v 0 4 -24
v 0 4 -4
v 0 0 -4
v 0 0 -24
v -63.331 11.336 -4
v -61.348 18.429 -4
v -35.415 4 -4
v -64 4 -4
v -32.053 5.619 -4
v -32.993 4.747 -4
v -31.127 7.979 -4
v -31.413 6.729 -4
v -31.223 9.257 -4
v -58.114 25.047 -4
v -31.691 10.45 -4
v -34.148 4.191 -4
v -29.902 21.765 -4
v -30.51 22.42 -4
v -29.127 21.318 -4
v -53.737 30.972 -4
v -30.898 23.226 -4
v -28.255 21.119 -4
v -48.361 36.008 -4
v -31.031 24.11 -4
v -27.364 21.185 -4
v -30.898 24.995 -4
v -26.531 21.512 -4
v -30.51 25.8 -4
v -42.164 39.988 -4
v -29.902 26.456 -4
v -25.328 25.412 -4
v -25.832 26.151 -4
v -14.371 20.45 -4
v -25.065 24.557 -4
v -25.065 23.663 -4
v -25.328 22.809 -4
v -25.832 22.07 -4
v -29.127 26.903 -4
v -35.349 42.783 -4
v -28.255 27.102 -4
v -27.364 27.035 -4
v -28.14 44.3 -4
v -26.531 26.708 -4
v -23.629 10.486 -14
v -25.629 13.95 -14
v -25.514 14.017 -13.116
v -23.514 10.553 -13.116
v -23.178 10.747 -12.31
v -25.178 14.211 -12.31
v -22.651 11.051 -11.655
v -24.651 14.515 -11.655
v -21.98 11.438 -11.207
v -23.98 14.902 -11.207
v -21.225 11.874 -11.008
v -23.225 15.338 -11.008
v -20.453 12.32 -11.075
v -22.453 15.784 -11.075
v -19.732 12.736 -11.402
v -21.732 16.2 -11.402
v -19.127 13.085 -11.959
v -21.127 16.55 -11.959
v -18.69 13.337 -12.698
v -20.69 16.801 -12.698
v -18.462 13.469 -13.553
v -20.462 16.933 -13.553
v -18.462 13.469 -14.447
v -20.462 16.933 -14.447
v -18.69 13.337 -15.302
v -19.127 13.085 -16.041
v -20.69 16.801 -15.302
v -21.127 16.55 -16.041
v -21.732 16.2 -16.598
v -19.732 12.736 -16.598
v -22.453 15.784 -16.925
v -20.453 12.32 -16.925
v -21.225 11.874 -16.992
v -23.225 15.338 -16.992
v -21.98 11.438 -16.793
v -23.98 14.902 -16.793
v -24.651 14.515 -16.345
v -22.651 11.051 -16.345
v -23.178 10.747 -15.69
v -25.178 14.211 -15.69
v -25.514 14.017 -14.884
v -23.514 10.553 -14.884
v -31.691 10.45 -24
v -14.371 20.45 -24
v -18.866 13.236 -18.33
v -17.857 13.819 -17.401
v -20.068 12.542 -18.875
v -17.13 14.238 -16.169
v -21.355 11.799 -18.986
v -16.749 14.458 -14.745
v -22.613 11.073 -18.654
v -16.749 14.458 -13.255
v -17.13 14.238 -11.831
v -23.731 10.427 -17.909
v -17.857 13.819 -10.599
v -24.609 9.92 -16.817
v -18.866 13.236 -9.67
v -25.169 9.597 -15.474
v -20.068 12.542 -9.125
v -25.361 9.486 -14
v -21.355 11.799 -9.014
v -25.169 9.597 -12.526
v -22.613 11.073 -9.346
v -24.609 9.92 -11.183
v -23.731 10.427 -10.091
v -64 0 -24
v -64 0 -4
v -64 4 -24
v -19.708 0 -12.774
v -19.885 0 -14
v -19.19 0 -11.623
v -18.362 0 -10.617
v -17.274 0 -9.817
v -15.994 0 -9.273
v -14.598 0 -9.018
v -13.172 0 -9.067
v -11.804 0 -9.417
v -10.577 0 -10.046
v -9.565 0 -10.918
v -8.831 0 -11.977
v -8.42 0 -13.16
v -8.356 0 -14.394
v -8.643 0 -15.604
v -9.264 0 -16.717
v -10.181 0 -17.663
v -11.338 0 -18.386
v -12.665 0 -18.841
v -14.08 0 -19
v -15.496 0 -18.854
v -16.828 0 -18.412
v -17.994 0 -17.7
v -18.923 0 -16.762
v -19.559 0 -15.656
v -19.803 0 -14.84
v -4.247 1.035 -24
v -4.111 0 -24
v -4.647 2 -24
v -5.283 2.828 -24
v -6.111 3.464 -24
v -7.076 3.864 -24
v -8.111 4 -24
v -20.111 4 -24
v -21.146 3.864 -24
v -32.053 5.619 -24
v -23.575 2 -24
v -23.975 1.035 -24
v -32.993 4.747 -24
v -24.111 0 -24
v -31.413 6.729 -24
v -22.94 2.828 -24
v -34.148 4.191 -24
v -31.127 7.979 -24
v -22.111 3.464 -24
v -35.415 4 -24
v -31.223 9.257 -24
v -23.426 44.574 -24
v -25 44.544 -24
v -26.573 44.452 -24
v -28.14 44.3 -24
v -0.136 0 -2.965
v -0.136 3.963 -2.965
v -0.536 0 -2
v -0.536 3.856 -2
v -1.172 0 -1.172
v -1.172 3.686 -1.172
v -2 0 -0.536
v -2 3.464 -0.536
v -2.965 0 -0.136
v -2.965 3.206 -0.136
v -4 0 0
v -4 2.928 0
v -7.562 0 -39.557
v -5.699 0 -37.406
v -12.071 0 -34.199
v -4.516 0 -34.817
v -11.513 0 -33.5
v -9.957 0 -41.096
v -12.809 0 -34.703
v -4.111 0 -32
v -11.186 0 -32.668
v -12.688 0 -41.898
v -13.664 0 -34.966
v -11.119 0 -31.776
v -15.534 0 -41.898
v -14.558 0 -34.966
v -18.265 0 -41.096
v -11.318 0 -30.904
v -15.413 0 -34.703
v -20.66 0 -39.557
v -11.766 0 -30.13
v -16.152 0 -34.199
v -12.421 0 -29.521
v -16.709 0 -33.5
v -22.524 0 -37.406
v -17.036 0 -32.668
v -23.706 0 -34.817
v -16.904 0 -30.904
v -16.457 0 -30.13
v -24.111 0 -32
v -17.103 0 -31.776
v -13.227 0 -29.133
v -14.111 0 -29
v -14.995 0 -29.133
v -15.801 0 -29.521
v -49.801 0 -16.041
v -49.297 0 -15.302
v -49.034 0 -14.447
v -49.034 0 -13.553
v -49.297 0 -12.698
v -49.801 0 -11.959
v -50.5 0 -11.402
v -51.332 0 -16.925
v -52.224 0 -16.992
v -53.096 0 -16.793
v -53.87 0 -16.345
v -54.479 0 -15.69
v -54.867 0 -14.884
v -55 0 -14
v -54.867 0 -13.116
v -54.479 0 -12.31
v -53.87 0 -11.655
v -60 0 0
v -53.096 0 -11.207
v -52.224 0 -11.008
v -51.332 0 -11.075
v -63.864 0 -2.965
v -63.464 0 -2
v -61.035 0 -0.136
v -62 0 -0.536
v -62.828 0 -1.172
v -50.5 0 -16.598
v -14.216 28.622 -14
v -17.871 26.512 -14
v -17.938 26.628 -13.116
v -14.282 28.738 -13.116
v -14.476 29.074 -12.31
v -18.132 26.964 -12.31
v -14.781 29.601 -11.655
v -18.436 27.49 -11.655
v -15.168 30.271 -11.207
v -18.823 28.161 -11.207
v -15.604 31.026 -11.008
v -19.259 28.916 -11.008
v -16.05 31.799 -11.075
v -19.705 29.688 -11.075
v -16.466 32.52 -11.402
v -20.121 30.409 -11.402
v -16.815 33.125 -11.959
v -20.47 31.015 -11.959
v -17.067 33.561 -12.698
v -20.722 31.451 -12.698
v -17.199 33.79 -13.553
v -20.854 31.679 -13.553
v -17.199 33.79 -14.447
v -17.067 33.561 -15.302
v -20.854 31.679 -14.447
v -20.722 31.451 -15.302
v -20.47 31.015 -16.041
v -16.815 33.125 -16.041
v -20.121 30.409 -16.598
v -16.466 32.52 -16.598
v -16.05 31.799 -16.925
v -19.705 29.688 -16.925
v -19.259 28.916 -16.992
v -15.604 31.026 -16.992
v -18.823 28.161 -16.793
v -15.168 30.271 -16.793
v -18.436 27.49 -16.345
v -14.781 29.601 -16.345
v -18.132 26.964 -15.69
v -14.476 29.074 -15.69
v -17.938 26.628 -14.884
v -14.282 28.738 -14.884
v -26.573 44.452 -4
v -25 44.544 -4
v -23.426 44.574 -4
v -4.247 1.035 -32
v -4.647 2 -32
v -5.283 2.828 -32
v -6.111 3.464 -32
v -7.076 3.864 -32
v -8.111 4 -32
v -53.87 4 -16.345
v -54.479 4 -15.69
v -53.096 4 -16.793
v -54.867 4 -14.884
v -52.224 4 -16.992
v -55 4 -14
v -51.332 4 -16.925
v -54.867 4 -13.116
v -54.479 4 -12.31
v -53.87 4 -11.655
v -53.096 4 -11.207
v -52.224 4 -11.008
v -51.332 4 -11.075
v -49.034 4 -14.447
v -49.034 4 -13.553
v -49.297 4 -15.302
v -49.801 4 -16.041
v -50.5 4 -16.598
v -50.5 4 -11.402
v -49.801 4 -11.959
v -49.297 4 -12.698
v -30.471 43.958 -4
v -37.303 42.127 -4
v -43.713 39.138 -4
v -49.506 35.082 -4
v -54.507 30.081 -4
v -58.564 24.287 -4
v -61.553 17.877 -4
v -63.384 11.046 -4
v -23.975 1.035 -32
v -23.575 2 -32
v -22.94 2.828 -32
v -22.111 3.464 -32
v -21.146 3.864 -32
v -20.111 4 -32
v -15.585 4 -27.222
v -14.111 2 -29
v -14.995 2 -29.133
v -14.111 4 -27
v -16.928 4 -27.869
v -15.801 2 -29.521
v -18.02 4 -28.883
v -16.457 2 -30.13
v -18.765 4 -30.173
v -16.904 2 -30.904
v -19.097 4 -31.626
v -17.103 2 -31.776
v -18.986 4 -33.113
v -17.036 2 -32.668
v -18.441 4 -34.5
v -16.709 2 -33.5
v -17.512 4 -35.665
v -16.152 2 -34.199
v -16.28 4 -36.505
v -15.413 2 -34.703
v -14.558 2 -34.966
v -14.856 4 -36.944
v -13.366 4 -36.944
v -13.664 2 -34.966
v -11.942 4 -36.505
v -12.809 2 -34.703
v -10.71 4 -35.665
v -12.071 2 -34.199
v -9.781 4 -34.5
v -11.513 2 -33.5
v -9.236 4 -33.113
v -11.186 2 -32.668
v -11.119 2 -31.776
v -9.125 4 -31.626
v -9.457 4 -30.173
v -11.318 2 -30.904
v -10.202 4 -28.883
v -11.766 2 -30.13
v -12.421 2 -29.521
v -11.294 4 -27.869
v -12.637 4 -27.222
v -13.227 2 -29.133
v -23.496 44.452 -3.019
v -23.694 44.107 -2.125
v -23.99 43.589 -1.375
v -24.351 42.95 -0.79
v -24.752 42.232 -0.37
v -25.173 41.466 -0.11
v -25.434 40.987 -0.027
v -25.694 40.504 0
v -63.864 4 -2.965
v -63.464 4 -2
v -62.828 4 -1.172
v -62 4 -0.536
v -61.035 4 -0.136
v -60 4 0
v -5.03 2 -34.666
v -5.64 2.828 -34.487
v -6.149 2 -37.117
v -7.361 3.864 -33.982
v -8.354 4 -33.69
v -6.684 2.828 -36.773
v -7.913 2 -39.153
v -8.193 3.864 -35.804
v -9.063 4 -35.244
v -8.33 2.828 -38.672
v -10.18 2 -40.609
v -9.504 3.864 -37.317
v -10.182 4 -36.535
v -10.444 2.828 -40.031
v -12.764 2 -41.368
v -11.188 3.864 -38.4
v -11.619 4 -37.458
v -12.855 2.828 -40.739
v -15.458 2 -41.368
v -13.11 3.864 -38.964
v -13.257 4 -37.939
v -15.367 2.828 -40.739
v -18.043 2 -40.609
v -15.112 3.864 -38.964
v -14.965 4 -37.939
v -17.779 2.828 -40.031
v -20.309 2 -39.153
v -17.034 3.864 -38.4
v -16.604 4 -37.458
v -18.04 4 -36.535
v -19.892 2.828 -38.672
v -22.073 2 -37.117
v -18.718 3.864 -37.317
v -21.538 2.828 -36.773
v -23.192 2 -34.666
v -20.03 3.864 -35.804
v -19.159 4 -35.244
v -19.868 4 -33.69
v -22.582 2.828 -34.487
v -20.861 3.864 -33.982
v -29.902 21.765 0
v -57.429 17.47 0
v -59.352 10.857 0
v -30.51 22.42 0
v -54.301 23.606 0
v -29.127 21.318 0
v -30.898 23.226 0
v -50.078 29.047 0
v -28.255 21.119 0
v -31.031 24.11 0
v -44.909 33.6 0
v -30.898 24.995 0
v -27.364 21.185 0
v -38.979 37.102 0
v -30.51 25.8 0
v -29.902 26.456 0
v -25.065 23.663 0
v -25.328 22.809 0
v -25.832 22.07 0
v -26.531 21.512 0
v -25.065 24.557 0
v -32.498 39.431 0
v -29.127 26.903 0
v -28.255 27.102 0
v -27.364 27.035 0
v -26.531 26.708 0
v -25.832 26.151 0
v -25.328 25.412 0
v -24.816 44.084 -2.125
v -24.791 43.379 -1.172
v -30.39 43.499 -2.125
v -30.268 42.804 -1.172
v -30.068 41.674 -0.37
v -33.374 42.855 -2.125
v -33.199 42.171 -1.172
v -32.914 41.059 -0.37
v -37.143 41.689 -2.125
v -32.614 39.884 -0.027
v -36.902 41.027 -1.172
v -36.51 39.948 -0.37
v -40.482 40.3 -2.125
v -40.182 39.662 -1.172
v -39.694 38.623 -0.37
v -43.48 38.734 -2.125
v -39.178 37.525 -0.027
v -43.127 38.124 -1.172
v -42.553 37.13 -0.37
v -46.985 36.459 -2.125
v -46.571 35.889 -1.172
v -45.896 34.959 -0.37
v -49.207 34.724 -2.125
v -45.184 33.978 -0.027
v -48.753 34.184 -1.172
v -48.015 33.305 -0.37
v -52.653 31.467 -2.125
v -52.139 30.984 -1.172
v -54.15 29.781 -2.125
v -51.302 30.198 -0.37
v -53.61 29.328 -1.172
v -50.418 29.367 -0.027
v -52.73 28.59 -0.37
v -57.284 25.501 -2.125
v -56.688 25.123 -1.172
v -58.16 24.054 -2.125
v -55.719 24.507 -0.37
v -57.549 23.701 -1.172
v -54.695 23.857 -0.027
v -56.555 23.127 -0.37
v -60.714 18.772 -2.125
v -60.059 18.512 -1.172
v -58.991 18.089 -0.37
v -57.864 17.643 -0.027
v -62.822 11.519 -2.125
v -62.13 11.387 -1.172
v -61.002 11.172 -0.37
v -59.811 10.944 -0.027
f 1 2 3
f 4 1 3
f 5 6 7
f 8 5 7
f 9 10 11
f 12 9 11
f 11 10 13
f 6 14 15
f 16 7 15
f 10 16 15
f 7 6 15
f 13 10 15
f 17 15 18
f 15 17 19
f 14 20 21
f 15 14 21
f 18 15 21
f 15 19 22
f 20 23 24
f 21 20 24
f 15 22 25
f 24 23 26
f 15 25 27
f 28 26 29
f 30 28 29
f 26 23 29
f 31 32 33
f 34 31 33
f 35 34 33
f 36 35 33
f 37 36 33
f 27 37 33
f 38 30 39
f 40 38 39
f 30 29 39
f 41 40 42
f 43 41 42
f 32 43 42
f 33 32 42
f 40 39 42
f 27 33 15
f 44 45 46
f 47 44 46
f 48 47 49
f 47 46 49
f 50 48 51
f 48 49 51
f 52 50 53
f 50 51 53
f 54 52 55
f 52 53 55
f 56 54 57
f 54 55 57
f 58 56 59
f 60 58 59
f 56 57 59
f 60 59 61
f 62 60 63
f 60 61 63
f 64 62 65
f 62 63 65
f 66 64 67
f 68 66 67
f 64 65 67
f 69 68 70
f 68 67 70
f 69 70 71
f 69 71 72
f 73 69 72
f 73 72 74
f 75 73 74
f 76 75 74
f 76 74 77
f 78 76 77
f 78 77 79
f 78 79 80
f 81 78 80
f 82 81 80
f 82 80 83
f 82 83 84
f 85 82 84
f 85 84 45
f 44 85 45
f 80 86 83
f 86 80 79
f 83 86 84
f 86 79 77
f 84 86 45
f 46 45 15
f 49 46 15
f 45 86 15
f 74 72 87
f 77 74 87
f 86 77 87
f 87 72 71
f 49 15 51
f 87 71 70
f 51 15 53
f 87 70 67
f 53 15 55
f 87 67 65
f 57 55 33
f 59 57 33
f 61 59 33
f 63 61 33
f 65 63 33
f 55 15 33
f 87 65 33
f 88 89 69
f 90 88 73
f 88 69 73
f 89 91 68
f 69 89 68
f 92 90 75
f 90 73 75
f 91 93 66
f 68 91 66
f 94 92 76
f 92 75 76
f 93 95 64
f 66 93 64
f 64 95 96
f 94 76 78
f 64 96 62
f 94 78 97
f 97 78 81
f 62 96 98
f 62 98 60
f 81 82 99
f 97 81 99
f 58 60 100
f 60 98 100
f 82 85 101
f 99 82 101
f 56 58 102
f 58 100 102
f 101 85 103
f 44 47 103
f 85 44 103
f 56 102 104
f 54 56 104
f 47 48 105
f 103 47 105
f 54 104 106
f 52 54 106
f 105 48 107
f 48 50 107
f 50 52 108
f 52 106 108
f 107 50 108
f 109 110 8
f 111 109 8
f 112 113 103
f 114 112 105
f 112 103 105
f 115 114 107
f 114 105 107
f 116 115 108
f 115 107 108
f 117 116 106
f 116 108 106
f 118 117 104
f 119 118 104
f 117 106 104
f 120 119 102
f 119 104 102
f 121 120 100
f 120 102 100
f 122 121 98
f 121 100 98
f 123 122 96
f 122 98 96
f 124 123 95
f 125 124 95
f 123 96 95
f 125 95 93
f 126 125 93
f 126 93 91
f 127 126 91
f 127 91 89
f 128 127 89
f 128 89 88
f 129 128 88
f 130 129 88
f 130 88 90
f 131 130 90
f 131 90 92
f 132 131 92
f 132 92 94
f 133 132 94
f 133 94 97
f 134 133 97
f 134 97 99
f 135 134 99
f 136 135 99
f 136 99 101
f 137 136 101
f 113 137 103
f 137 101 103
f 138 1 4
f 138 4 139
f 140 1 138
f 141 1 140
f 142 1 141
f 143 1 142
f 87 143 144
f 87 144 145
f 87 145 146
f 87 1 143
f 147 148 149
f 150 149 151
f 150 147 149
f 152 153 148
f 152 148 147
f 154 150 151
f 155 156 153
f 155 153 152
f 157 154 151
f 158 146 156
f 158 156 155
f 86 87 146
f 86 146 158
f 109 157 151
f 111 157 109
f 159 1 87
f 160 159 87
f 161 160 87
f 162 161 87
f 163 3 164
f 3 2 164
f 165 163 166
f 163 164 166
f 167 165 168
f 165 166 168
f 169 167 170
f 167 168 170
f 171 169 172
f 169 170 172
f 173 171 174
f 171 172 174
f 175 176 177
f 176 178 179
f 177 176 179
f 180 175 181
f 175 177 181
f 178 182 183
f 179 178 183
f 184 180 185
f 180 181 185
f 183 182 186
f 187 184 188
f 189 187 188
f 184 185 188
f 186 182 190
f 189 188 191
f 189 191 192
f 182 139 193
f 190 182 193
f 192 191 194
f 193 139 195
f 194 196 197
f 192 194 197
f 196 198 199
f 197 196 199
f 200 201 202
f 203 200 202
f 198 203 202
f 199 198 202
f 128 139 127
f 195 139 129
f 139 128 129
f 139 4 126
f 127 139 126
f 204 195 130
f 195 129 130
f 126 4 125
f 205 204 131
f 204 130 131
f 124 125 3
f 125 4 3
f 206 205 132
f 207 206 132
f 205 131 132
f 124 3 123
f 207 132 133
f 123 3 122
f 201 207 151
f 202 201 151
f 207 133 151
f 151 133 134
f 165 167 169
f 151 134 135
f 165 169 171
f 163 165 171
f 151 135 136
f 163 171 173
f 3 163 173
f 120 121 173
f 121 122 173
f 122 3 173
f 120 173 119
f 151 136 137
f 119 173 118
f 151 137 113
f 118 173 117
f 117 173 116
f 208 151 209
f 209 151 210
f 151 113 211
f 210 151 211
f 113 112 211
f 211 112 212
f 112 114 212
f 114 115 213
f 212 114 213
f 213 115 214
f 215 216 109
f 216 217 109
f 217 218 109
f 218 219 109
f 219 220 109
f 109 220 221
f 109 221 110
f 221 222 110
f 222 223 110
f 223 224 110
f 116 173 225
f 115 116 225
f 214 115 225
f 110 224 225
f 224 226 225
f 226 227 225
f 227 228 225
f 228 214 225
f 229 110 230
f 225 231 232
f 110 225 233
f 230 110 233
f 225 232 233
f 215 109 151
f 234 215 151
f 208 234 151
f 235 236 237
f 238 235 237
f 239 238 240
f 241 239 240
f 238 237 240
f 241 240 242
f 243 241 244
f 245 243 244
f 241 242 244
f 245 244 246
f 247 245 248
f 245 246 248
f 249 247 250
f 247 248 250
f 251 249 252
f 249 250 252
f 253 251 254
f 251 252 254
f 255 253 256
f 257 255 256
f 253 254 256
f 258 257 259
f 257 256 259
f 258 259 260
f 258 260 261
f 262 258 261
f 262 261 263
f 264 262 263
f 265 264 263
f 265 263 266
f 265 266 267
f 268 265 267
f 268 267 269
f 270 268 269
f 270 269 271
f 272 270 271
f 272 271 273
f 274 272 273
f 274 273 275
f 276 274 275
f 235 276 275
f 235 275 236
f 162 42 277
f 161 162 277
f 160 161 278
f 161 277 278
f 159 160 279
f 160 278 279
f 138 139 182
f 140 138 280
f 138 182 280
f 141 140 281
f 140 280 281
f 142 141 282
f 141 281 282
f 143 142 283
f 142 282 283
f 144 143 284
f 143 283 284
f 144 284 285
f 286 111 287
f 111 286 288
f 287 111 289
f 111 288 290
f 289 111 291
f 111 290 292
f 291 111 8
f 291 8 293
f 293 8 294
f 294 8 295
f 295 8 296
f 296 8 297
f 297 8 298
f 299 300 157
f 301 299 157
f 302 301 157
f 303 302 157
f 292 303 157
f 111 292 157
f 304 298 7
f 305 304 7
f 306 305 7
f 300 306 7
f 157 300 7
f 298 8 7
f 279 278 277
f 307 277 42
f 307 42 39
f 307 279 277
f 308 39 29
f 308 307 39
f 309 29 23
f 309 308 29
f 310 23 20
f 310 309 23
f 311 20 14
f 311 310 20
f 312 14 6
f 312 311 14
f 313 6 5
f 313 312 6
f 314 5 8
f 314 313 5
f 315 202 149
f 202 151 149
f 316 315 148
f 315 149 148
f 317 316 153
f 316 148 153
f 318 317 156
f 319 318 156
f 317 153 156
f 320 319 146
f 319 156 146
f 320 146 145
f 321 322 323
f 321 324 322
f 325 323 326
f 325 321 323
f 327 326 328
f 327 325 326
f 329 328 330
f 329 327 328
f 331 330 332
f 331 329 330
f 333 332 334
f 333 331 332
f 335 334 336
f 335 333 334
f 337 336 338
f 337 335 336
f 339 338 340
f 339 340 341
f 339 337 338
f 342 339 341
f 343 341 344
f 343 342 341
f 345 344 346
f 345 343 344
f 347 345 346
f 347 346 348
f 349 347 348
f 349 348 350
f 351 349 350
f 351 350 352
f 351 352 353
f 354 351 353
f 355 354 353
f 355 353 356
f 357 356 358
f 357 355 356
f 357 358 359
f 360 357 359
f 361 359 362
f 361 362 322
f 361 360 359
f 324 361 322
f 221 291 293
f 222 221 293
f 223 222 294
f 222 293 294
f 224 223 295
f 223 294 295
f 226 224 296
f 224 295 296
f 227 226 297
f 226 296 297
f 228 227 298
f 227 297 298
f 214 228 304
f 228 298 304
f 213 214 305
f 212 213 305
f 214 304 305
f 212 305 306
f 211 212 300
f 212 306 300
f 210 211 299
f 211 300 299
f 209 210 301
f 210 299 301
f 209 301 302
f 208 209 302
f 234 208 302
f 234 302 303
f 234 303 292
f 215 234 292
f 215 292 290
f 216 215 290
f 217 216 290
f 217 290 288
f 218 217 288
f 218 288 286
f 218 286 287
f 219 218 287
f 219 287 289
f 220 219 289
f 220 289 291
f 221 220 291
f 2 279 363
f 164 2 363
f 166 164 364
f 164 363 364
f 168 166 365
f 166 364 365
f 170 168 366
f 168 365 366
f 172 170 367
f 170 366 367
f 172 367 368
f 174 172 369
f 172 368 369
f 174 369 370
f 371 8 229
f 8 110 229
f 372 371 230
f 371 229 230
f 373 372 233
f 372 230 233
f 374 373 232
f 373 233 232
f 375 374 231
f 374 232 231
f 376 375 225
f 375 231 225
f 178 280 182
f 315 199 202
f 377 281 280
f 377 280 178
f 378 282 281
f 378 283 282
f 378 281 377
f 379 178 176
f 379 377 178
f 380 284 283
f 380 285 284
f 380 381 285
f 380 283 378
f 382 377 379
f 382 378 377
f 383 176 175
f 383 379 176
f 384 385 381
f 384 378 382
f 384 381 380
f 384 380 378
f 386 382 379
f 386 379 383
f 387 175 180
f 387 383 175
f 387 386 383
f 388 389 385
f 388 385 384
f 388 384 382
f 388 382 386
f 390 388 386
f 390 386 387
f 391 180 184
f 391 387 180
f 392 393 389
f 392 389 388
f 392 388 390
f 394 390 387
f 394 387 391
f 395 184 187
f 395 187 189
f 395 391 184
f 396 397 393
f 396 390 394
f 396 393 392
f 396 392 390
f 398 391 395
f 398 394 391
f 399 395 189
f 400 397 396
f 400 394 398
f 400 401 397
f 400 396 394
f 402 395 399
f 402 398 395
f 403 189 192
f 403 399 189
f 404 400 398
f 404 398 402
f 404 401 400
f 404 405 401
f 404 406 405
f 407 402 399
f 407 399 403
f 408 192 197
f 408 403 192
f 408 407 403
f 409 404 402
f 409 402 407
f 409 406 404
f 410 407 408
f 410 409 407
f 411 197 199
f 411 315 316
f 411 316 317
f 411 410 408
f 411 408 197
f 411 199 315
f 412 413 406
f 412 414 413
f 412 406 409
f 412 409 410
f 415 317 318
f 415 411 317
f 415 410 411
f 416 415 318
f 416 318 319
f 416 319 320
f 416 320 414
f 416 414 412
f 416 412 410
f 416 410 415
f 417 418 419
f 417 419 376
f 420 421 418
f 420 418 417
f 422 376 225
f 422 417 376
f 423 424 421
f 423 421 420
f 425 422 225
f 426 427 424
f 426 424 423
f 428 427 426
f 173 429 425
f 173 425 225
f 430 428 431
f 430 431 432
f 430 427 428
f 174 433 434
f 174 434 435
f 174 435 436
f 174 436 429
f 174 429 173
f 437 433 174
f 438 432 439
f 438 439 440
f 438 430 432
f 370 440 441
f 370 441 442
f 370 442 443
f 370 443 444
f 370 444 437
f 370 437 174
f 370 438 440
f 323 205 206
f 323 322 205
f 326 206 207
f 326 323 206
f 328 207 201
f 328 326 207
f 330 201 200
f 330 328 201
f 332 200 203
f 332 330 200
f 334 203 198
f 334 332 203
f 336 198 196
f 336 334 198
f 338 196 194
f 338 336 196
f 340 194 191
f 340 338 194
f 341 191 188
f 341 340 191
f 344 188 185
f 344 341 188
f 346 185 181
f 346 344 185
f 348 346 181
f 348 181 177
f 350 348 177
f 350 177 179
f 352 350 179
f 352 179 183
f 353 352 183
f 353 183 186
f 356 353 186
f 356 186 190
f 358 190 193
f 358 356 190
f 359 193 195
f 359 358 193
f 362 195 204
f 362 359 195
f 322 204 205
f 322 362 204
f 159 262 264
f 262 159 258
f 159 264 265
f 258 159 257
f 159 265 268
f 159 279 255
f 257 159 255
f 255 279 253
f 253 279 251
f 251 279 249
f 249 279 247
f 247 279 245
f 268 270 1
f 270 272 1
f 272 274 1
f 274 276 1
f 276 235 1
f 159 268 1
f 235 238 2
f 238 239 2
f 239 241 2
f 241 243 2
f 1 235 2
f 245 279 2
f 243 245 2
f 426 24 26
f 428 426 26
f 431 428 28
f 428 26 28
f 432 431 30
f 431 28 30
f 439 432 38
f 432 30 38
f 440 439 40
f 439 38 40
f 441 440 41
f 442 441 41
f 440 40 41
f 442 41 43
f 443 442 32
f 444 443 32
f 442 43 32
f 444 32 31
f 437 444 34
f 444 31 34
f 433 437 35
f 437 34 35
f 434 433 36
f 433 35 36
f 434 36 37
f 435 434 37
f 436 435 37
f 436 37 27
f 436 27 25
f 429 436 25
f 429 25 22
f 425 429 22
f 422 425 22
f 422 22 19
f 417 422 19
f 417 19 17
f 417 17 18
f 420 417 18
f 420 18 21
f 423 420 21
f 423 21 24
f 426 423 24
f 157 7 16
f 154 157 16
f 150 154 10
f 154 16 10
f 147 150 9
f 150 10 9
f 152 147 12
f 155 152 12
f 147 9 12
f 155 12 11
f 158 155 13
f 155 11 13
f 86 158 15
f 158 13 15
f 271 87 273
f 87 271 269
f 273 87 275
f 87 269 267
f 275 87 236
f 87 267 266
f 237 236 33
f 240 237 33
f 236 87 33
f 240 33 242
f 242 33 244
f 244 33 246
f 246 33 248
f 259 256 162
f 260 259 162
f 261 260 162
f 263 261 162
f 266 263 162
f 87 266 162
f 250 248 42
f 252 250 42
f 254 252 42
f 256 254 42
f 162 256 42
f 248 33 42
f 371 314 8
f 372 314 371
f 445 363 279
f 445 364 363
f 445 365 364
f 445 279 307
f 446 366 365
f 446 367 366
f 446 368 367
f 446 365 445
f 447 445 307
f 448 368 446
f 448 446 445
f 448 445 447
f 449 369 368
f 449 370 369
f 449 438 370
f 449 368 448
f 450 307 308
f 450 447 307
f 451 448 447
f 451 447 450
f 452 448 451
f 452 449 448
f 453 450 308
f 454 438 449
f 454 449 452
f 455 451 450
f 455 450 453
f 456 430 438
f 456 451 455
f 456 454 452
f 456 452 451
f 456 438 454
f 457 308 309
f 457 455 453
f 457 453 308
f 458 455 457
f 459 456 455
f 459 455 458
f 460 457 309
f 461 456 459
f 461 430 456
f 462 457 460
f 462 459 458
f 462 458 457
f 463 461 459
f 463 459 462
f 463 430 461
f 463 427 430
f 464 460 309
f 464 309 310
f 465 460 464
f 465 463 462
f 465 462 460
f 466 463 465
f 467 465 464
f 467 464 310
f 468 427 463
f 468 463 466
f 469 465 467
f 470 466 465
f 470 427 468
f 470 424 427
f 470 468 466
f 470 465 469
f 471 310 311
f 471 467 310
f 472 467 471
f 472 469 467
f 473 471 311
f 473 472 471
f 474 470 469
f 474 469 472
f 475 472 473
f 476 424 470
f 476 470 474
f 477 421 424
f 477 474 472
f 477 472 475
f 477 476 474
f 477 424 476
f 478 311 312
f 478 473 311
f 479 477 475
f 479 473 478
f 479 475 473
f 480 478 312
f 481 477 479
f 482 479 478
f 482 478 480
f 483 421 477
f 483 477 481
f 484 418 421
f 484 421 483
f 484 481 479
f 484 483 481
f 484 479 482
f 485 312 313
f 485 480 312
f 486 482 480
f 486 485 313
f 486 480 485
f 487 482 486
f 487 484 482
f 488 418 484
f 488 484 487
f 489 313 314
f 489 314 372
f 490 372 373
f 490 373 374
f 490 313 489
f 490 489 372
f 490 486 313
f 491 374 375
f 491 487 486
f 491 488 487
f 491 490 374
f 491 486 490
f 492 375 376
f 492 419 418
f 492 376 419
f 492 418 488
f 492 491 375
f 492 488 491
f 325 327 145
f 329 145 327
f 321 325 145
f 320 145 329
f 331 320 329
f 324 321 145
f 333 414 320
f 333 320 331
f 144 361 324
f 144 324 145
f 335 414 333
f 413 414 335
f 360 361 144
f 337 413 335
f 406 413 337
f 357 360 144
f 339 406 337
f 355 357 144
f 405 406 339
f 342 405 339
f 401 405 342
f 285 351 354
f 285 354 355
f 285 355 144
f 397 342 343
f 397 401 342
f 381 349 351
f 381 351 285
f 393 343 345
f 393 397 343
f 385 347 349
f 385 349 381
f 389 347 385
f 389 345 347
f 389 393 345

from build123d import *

# Parameters (mm, degrees)
BOSS_EXTRUDE1_DEPTH = 4
BOSS_EXTRUDE2_DEPTH = 20
SKETCH3_R           = 3
CUT_EXTRUDE1_DEPTH  = 62.345545492
SKETCH4_R           = 5
CUT_EXTRUDE2_DEPTH  = 65.381139123
SKETCH5_R           = 3
CUT_EXTRUDE3_DEPTH  = 81.725682082
SKETCH6_R           = 3
CUT_EXTRUDE4_DEPTH  = 80.48760808
SKETCH7_R           = 3
CUT_EXTRUDE5_DEPTH  = 81.516301651
BOSS_EXTRUDE3_DEPTH = 4
FILLET1_R           = 4
FILLET2_R           = 4


with BuildPart() as part:
    # Sketch1 → Boss-Extrude1 (new body)
    with BuildSketch(Plane.XY):
        with BuildLine():
            Line((0, 0), (0, 4))
            Line((0, 4), (-23.425625842, 44.574374158))
            ThreePointArc((-23.425625842, 44.574374158), (-52.116040952, 32.690415109), (-64, 4))
            Line((-64, 4), (-64, 0))
            Line((-64, 0), (0, 0))
        make_face()
    extrude(amount=-BOSS_EXTRUDE1_DEPTH)

    # Sketch2 → Boss-Extrude2 (add)
    with BuildSketch(Plane(origin=(0, 0, -4), x_dir=(-1, 0, 0), z_dir=(0, 0, -1))):
        with BuildLine():
            Line((64, 4), (35.415278297, 4))
            ThreePointArc((35.415278297, 4), (31.691369061, 6.15), (31.691369061, 10.45))
            Line((31.691369061, 10.45), (14.370860985, 20.45))
            Line((14.370860985, 20.45), (28.140384731, 44.299514723))
            ThreePointArc((28.140384731, 44.299514723), (25.787007804, 44.505601014), (23.425625842, 44.574374158))
            Line((23.425625842, 44.574374158), (0, 4))
            Line((0, 4), (0, 0))
            Line((0, 0), (64, 0))
            Line((64, 0), (64, 4))
        make_face()
    extrude(amount=BOSS_EXTRUDE2_DEPTH)

    # Sketch3 → Cut-Extrude1 (cut, through all)
    with BuildSketch(Plane(origin=(-12.447825, 21.560265344, 0), x_dir=(0.8660254037844387, 0.49999999999999983, 0), z_dir=(-0.49999999999999983, 0.8660254037844387, 0))):
        with Locations(Location((-12.220530687, 14, 0), (0, 0, 180))):
            Circle(SKETCH3_R)
    extrude(amount=-CUT_EXTRUDE1_DEPTH, mode=Mode.SUBTRACT)

    # Sketch4 → Cut-Extrude2 (cut, through all)
    with BuildSketch(Plane(origin=(-10.447825, 18.096163729, 0), x_dir=(-0.8660254037844387, -0.49999999999999983, 0), z_dir=(-0.49999999999999983, 0.8660254037844387, 0))):
        with Locations((12.220530687, -14)):
            Circle(SKETCH4_R)
    extrude(amount=-CUT_EXTRUDE2_DEPTH, mode=Mode.SUBTRACT)

    # Sketch5 → Cut-Extrude3 (cut, through all)
    with BuildSketch(Plane(origin=(-1.923035985, -1.110265344, 0), x_dir=(0, 0, 1), z_dir=(-0.8660254037844386, -0.5000000000000001, 0))):
        with Locations(Location((-14, 34.89565, 0), (0, 0, 270))):
            Circle(SKETCH5_R)
    extrude(amount=-CUT_EXTRUDE3_DEPTH, mode=Mode.SUBTRACT)

    # Sketch6 → Cut-Extrude4 (cut, through all)
    with BuildSketch(Plane(origin=(0, 4, 0), x_dir=(1, 0, 0), z_dir=(0, 1, 0))):
        with Locations(Location((-52, 14, 0), (0, 0, 180))):
            Circle(SKETCH6_R)
    extrude(amount=-CUT_EXTRUDE4_DEPTH, mode=Mode.SUBTRACT)

    # Sketch7 → Cut-Extrude5 (cut, through all)
    with BuildSketch(Plane(origin=(0, 0, -4), x_dir=(-1, 0, 0), z_dir=(0, 0, -1))):
        with Locations((28.031115023, 24.110254038)):
            Circle(SKETCH7_R)
    extrude(amount=-CUT_EXTRUDE5_DEPTH, mode=Mode.SUBTRACT)

    # Sketch8 → Boss-Extrude3 (add)
    with BuildSketch(Plane(origin=(0, 0, 0), x_dir=(1, 0, 0), z_dir=(0, 1, 0))):
        with BuildLine():
            Line((-24.111053364, 24), (-4.111053364, 24))
            Line((-4.111053364, 24), (-4.111053364, 32))
            ThreePointArc((-4.111053364, 32), (-14.111053364, 42), (-24.111053364, 32))
            Line((-24.111053364, 32), (-24.111053364, 24))
        make_face()
    extrude(amount=BOSS_EXTRUDE3_DEPTH)

    # Sketch9 → Cut-Revolve2 (revolve, cut)
    with BuildSketch(Plane.XY.offset(-32), mode=Mode.PRIVATE) as cut_revolve2_sk:
        Polygon((-17.111053364, 0), (-17.111053364, 2), (-19.111053364, 4), (-14.111053364, 4), (-14.111053364, 0), align=None)
    revolve(cut_revolve2_sk.sketch.rotate(Axis((-14.111053364, 4, -32), (0, -1, 0)), 270), axis=Axis((-14.111053364, 4, -32), (0, -1, 0)), mode=Mode.SUBTRACT)

    # Fillet1
    fillet1_edges = [part.edges().sort_by_distance(p)[0] for p in [
        (-24.111053364, 4, -28),
        (-14.111053364, 4, -42),
        (-4.111053364, 4, -28),
    ]]
    fillet(fillet1_edges, radius=FILLET1_R - 0.0001)  # a hair under: the kernel refuses the full size

    # Fillet2
    fillet2_edges = [part.edges().sort_by_distance(p)[0] for p in [
        (-64, 2, 0),
        (0, 2, 0),
        (-11.712812921, 24.287187079, 0),
        (-52.116040952, 32.690415109, 0),
    ]]
    fillet(fillet2_edges, radius=FILLET2_R - 0.0001)  # a hair under: the kernel refuses the full size


solid = part.part
